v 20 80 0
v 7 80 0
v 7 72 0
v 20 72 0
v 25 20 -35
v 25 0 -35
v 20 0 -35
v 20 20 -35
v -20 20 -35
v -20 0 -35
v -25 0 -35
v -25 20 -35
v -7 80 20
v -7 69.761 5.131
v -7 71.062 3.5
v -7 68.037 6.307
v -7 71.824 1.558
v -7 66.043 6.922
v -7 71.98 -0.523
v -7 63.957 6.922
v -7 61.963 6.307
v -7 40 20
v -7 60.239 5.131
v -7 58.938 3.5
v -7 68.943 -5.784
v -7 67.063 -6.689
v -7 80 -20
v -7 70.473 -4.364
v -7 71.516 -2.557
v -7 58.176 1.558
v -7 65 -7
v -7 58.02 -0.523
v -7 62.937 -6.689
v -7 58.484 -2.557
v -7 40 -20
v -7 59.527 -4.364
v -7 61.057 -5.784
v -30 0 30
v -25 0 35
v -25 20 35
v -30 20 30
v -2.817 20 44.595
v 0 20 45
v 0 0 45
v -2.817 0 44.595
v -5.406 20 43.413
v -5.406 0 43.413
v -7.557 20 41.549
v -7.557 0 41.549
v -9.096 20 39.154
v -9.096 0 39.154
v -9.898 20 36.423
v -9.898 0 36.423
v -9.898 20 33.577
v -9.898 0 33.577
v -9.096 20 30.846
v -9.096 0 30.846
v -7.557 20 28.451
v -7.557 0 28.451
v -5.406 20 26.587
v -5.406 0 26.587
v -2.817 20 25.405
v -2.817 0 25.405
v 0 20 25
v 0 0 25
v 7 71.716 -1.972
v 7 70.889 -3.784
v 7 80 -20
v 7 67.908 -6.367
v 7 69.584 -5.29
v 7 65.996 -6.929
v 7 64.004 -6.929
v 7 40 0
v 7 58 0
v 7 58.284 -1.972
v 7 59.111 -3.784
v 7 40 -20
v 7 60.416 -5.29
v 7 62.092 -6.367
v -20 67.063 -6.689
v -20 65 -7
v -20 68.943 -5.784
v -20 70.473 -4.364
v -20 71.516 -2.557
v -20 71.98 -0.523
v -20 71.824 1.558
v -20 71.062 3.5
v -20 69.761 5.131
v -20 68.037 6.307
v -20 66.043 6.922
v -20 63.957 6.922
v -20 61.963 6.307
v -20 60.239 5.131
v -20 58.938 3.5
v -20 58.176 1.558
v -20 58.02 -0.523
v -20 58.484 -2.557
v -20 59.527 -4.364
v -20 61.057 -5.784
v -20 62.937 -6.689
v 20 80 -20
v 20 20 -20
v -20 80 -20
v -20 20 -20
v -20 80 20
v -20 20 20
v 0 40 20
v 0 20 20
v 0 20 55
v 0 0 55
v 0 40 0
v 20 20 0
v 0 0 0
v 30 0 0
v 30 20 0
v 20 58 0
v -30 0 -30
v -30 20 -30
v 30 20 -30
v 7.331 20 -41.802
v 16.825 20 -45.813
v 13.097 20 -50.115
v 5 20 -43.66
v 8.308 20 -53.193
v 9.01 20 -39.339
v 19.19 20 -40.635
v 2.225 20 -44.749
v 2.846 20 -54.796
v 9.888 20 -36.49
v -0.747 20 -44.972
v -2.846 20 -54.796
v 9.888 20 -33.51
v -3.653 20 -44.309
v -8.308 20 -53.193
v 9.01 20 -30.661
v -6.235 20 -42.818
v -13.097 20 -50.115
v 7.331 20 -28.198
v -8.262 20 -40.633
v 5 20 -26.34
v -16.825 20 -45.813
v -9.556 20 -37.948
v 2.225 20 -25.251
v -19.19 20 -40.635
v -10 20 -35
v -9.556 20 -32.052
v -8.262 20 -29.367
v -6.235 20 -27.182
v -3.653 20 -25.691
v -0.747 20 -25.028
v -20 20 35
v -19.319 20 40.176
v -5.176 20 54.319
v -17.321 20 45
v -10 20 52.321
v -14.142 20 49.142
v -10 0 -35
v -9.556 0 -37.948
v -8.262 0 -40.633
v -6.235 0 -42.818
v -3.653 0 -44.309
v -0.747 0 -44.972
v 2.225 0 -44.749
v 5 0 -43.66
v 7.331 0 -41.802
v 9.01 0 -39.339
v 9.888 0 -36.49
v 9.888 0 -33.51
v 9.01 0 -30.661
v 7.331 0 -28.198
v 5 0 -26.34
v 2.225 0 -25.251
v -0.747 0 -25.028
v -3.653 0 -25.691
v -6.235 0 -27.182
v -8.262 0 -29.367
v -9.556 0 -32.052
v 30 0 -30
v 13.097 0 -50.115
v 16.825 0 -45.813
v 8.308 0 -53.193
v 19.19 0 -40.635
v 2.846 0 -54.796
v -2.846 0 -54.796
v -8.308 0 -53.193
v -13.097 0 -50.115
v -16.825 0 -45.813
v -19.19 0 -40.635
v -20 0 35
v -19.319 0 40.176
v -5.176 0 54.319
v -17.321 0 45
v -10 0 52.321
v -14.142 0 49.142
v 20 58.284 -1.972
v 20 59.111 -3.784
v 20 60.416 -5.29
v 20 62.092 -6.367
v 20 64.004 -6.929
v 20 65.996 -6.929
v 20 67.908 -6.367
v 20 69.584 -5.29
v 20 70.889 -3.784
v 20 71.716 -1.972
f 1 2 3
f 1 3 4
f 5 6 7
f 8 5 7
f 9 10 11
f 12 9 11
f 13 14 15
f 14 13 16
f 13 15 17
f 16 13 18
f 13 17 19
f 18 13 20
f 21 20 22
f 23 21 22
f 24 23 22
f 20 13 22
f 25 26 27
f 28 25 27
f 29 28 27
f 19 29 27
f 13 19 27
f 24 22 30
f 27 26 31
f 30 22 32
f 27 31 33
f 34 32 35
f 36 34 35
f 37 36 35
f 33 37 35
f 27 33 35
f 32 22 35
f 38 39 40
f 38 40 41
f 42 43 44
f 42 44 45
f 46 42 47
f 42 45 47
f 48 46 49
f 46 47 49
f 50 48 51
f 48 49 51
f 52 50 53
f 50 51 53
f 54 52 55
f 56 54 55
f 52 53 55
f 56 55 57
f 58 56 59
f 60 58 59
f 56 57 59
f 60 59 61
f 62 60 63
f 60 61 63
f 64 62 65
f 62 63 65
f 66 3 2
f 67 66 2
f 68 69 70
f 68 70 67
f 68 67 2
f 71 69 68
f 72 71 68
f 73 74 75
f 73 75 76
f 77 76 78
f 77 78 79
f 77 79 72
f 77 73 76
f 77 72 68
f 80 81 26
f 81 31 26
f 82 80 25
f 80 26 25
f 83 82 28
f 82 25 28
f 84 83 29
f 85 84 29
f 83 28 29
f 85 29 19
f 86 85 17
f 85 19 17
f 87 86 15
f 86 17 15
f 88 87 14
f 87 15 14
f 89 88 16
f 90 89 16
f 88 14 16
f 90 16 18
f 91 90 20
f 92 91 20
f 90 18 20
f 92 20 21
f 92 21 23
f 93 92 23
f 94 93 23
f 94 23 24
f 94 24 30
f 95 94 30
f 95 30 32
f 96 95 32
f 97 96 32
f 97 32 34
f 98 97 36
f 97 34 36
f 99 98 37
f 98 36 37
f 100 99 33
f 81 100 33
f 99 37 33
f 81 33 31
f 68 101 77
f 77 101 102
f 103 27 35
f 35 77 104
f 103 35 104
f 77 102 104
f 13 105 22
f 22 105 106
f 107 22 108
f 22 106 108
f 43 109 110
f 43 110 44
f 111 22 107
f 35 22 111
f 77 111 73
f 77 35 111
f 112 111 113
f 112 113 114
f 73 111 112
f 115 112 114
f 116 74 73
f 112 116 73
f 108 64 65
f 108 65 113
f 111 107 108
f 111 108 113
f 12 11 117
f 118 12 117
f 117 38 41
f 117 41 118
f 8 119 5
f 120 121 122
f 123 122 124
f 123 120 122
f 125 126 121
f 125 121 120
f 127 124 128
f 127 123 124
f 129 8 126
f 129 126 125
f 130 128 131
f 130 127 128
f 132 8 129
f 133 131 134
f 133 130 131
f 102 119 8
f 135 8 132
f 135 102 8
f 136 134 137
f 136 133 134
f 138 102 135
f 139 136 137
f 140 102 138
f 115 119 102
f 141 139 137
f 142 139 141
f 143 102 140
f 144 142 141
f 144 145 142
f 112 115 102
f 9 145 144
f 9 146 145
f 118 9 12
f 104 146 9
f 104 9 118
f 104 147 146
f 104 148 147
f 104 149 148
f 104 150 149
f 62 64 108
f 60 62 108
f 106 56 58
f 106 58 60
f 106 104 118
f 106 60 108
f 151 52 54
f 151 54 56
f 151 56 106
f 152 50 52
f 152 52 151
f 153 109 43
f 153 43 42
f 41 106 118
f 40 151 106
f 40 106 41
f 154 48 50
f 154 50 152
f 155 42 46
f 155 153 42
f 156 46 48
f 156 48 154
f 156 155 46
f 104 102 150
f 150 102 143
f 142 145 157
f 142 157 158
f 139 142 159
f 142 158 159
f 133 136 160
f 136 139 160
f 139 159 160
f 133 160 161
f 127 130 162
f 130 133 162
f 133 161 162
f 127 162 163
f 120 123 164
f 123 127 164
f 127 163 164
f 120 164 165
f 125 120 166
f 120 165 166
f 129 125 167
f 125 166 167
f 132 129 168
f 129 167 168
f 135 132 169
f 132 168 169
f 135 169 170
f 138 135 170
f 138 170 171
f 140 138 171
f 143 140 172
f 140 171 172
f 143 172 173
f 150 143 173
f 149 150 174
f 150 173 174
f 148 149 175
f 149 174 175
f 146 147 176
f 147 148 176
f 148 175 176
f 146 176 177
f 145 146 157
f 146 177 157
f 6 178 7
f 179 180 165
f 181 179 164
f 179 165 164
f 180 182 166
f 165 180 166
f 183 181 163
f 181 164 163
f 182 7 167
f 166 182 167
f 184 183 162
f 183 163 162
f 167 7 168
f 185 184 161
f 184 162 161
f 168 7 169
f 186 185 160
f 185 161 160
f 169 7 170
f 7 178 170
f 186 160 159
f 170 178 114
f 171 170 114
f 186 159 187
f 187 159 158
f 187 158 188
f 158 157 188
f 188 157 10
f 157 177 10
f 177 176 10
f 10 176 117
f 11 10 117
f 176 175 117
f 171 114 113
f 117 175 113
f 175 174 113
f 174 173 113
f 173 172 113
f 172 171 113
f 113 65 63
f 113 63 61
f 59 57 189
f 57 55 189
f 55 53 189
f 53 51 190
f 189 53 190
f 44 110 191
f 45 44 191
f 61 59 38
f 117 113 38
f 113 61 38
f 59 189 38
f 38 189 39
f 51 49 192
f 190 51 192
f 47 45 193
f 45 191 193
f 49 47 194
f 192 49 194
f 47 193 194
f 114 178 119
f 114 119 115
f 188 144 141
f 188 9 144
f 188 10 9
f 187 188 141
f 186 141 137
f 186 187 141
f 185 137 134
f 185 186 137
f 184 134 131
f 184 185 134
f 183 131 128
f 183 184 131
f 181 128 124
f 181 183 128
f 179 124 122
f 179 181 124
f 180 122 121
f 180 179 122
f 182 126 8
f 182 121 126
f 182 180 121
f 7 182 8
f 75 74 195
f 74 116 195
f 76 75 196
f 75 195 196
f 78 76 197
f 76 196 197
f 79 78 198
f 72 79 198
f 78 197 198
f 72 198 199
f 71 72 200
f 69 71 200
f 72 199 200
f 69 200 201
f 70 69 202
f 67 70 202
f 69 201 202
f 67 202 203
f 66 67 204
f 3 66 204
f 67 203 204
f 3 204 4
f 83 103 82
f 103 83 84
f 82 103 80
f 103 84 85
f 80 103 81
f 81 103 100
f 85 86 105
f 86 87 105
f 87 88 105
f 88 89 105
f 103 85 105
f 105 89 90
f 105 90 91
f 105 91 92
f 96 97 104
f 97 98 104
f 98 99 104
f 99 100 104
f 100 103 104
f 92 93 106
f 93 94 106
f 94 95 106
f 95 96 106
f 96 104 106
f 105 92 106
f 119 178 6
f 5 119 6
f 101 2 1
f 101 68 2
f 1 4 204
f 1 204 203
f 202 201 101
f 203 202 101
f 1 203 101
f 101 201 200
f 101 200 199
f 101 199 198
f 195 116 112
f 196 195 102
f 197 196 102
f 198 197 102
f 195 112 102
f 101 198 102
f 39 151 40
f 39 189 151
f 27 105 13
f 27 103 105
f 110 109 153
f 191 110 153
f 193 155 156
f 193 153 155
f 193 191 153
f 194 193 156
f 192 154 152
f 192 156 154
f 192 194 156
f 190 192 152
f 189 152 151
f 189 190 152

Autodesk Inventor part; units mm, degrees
ref_plane "YZ Plane" through (0, 0, 0) normal (1, 0, 0) x (0, 1, 0)
ref_plane "XY Plane" through (0, 0, 0) normal (0, 0, 1) x (1, 0, 0)
sketch "Эскиз1" plane through (0, 0, 0) normal (0, 1, 0) x (-1, 0, 0)
  line L0 (-30, 0) -> (-30, -30)
  line L1 (-30, 0) -> (-30, 30)
  circle A0 centre (0, 35) radius 10
  arc A1 (20, 35) -> (-20, 35) centre (0, 35) ccw
  line L2 (-25, 35) -> (-30, 30)
  circle A2 centre (0, -35) radius 10
  arc A3 (-20, -35) -> (20, -35) centre (0, -35) ccw
  line L3 (-30, -30) -> (-25, -35)
  line L4 (30, 30) -> (30, -30)
  line L5 (25, 35) -> (30, 30)
  line L6 (25, -35) -> (30, -30)
  line L7 (-25, 35) -> (-20, 35)
  line L8 (20, 35) -> (25, 35)
  line L9 (-25, -35) -> (-20, -35)
  line L10 (20, -35) -> (25, -35)
  point P0 (0, 0)
  point P1 (-30, -35)
  point P2 (-30, 35)
  point P3 (30, 35)
  point P4 (30, -35)
  point P5 (30, 35)
  point P6 (30, -35)
  dimension "d0" = 35
  dimension "d1" = 35
  dimension "d2" = 20
  dimension "d3" = 40
  dimension "d4" = 5
  dimension "d5" = 5
  dimension "d6" = 20
  dimension "d7" = 40
  dimension "d8" = 5
  dimension "d9" = 5
  dimension "d10" = 5
  dimension "d11" = 5
  dimension "d12" = 5
  dimension "d13" = 5
extrude "Выдавливание1" add sketch "Эскиз1" along normal blind 20
sketch "Эскиз2" plane through (0, 20, 0) normal (0, 1, 0) x (1, 0, 0)
  line L0 (20, 20) -> (-20, 20)
  line L1 (-20, 20) -> (-20, -20)
  line L2 (-20, -20) -> (20, -20)
  line L3 (20, -20) -> (20, 20)
  line L4 (20, 20) -> (-20, -20) construction
  line L5 (-20, 20) -> (20, -20) construction
  point P0 (0, 0)
  dimension "d16" = 40
  dimension "d17" = 40
extrude "Выдавливание2" add sketch "Эскиз2" along normal blind 20
sketch "Эскиз3" plane through (0, 40, 0) normal (0, 1, 0) x (1, 0, 0)
  line L0 (-7, -20) -> (-7, 20)
  line L1 (-7, -20) -> (-20, -20)
  line L2 (-20, -20) -> (-20, 20)
  line L3 (7, -20) -> (7, 20)
  line L4 (20, -20) -> (7, -20)
  line L5 (-7, -20) -> (-20, -20)
  line L6 (-20, 20) -> (-7, 20)
  line L7 (20, 20) -> (20, -20) projected
  line L8 (20, -20) -> (20, 20)
  line L9 (20, 20) -> (7, 20)
  point P0 (0, 0)
extrude "Выдавливание3" add sketch "Эскиз3" along normal blind 40
sketch "Эскиз4" plane through (20, 20, 20) normal (1, 0, 0) x (0, 0, -1)
  circle A0 centre (20, 45) radius 7
  point P0 (20, -20)
  dimension "d22" = 14
extrude "Выдавливание4" cut sketch "Эскиз4" against normal blind 40
ref_plane "РабПлоскость1" through (0, 80, 0) normal (0, 1, 0) x (-1, 0, 0)
sketch "Эскиз5" plane through (0, 80, 0) normal (0, 1, 0) x (-1, 0, 0)
  line L0 (0, 0) -> (-33, 0)
  line L1 (-33, 0) -> (-33, 61)
  line L2 (-33, 61) -> (0, 61)
  line L3 (0, 61) -> (0, 0)
extrude "Выдавливание5" cut sketch "Эскиз5" against normal blind 80
equation "\"d5\" = d4"
equation "\"d9\" = d8"
equation "\"d11\" = d10"
equation "\"d12\" = d10"
equation "\"d13\" = d12"
properties part number "пч2020"
